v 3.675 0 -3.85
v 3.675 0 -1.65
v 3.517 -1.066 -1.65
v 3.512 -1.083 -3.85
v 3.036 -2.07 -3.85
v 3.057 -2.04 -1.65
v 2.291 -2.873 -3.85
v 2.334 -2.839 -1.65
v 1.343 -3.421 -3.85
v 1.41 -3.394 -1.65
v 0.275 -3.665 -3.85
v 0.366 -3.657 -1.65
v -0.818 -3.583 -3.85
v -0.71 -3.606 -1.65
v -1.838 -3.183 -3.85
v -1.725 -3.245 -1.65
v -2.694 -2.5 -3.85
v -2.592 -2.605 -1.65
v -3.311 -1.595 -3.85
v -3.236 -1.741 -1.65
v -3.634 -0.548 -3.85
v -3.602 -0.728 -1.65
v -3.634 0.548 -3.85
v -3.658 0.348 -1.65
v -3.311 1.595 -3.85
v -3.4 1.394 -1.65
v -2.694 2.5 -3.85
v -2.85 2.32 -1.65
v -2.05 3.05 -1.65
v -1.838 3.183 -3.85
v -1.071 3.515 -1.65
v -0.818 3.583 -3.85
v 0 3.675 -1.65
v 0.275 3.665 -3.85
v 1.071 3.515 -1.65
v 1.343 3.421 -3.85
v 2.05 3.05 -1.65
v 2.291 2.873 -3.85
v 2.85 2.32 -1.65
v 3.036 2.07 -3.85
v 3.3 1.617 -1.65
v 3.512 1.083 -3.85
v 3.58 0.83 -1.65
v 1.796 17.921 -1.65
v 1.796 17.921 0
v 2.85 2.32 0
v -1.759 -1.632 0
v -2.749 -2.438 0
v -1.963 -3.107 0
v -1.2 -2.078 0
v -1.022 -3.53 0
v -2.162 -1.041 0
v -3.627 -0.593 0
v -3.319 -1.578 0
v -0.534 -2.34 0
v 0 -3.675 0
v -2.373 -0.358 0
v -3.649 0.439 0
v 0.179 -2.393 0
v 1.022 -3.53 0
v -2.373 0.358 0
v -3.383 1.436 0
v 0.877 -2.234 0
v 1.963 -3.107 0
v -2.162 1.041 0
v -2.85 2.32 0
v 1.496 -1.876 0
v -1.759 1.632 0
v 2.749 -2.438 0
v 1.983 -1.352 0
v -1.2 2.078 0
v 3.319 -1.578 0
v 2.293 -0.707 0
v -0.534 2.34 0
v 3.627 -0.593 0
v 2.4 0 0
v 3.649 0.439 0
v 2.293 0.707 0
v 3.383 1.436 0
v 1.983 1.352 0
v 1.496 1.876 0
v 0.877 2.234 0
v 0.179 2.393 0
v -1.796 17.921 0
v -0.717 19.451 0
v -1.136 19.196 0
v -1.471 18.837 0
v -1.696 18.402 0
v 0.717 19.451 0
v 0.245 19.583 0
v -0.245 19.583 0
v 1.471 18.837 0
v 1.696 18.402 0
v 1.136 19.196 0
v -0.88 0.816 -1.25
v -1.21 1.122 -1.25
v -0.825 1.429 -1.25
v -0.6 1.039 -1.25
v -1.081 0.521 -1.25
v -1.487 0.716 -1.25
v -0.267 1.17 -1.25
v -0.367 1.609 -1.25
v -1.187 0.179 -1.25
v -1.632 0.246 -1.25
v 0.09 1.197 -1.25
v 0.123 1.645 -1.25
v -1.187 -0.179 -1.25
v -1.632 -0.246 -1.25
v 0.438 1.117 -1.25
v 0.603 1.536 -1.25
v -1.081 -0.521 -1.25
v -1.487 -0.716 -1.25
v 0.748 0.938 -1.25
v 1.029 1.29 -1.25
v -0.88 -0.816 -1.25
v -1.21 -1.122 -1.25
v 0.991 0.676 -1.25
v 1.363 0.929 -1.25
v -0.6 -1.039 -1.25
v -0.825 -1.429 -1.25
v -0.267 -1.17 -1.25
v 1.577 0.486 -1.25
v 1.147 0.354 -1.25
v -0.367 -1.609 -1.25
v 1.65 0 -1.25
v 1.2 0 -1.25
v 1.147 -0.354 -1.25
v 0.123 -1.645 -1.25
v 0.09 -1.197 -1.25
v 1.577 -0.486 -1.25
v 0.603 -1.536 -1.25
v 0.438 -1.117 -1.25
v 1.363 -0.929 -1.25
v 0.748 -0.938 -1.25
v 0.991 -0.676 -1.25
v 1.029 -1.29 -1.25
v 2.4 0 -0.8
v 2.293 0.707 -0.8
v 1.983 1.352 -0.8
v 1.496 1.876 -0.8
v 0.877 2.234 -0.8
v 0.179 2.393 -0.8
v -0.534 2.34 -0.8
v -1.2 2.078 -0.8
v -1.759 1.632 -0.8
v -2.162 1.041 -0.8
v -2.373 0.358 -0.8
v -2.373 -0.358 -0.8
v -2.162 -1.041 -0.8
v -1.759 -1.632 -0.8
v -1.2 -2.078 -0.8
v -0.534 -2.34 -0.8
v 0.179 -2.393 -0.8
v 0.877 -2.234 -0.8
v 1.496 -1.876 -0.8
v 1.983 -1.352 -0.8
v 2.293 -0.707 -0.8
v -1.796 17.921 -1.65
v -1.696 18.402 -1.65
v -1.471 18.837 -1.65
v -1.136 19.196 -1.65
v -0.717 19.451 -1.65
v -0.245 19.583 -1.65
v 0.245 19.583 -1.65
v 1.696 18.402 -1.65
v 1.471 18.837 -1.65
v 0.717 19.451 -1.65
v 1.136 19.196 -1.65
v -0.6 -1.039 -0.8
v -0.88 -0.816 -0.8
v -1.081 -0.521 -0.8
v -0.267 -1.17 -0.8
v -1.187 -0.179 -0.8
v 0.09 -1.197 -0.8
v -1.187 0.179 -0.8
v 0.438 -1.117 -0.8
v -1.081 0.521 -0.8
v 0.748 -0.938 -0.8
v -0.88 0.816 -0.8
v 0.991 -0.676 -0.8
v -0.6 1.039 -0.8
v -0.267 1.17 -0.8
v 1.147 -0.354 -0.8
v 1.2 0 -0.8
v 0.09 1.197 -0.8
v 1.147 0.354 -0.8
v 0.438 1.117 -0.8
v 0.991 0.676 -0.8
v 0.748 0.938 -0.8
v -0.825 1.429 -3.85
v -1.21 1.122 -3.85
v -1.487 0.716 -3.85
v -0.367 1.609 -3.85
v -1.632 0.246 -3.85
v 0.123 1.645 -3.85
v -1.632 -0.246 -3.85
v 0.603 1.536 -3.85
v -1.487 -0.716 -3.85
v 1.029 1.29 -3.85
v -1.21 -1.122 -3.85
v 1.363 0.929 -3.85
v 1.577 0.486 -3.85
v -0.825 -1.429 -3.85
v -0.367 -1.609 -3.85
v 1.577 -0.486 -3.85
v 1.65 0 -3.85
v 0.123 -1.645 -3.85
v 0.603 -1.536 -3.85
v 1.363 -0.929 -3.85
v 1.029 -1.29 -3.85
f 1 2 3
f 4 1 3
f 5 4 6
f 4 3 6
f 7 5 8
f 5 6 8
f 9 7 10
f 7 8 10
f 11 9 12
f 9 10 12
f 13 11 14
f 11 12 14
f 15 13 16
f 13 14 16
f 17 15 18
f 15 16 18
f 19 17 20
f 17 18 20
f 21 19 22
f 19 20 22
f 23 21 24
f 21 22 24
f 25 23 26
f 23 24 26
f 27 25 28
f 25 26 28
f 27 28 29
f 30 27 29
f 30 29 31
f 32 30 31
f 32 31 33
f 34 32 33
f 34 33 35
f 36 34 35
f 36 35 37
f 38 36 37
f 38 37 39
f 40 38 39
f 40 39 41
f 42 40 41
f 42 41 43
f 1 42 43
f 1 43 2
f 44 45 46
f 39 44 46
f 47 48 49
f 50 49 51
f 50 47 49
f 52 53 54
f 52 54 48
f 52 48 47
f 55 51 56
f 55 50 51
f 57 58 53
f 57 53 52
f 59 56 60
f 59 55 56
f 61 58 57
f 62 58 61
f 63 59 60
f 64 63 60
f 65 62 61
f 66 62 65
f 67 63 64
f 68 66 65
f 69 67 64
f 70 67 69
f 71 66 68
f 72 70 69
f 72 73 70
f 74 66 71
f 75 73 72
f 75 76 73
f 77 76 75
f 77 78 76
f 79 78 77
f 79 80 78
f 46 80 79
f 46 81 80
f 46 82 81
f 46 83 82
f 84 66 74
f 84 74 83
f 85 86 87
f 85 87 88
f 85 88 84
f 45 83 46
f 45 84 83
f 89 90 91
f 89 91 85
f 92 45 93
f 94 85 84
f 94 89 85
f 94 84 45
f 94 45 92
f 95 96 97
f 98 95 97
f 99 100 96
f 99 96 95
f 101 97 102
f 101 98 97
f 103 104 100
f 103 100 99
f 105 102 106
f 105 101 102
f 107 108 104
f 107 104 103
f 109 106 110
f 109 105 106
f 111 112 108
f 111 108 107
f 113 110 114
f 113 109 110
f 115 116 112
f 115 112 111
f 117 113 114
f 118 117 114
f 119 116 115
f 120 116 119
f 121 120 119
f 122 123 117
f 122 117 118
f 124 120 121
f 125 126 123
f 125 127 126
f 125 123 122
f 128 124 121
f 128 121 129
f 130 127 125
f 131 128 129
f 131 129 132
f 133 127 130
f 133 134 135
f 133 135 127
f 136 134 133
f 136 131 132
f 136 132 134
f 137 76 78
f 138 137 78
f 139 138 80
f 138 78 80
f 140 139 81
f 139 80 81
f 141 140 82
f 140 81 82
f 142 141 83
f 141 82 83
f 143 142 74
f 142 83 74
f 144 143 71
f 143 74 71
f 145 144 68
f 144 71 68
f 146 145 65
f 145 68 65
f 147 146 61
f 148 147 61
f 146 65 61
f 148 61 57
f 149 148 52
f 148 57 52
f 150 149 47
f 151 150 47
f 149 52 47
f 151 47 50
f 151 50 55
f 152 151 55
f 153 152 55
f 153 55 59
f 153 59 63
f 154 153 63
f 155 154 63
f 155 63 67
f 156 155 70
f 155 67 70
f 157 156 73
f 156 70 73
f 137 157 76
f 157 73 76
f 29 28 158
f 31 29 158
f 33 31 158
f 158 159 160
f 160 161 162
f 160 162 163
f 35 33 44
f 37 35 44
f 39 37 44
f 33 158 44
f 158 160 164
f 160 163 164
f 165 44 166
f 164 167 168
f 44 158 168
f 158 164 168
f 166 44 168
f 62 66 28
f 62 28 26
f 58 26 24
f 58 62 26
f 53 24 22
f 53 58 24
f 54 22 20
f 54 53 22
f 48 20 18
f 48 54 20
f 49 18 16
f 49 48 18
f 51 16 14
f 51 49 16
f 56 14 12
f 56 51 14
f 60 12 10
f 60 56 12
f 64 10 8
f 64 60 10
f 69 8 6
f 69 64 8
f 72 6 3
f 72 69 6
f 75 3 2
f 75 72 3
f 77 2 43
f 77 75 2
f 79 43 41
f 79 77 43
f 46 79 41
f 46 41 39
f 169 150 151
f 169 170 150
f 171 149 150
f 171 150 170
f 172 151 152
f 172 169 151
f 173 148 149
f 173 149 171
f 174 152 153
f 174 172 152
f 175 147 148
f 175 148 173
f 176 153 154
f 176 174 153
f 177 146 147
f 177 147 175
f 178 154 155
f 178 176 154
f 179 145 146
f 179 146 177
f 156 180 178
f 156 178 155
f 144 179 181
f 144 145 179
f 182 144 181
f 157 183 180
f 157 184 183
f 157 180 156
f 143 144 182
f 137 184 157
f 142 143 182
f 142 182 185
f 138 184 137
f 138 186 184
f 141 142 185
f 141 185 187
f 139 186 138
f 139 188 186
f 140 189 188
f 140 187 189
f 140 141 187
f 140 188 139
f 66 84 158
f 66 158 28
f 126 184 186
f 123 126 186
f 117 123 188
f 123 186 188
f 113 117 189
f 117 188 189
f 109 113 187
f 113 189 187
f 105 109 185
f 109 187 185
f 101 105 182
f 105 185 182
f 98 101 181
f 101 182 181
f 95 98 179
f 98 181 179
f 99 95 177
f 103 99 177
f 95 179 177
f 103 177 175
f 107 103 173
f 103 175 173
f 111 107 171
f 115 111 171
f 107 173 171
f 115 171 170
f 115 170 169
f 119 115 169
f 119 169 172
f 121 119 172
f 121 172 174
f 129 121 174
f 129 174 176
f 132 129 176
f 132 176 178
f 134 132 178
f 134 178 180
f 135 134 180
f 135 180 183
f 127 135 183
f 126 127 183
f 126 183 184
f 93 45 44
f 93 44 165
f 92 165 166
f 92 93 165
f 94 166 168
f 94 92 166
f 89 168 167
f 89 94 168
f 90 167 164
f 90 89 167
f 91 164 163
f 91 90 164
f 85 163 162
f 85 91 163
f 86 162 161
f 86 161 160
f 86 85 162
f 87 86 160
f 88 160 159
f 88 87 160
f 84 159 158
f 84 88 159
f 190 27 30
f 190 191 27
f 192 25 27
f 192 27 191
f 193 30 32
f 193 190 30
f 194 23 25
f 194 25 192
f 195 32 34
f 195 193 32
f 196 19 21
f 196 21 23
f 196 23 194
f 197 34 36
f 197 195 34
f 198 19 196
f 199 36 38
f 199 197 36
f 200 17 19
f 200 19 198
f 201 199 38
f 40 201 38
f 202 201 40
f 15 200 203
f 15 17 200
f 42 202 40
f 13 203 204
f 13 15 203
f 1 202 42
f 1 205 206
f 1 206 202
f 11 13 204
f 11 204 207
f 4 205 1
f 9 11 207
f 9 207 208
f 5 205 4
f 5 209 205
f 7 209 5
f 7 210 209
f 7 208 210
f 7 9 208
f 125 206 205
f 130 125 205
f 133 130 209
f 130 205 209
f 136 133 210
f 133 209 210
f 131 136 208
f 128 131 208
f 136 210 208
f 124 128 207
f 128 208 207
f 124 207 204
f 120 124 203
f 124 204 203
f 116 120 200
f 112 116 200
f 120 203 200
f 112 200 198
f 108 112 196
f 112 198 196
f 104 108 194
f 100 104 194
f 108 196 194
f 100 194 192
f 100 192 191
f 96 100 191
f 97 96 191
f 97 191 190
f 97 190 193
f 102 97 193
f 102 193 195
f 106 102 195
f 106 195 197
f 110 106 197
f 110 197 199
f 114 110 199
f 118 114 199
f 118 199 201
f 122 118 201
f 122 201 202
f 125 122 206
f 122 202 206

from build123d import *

# Parameters (mm, degrees)
PAD_DEPTH       = 1.65
SKETCH001_R     = 3.675
PAD001_DEPTH    = 2.2
SKETCH002_R     = 1.65
POCKET_DEPTH    = 2.6
SKETCH003_R     = 2.4
POCKET001_DEPTH = 0.8
SKETCH004_R     = 1.2
POCKET002_DEPTH = 3.051


with BuildPart() as part:
    # Sketch → Pad (new body)
    with BuildSketch(Plane.XY):
        with BuildLine():
            Line((-1.795904, 17.921356), (-2.85, 2.320156))
            ThreePointArc((-2.85, 2.320156), (0, -3.675), (2.85, 2.320156))
            Line((1.795904, 17.921356), (2.85, 2.320156))
            ThreePointArc((1.795904, 17.921356), (0, 19.6), (-1.795904, 17.921356))
        make_face()
    extrude(amount=-PAD_DEPTH)

    # Sketch001 → Pad001 (new body)
    with BuildSketch(Plane(origin=(0, 0, -1.65), x_dir=(1, 0, 0), z_dir=(0, 0, -1))):
        Circle(SKETCH001_R)
    extrude(amount=PAD001_DEPTH)

    # Sketch002 → Pocket (cut)
    with BuildSketch(Plane(origin=(0, 0, -3.85), x_dir=(1, 0, 0), z_dir=(0, 0, -1))):
        Circle(SKETCH002_R)
    extrude(amount=-POCKET_DEPTH, mode=Mode.SUBTRACT)

    # Sketch003 → Pocket001 (cut)
    with BuildSketch(Plane.XY):
        Circle(SKETCH003_R)
    extrude(amount=-POCKET001_DEPTH, mode=Mode.SUBTRACT)

    # Sketch004 → Pocket002 (cut, through all)
    with BuildSketch(Plane.XY.offset(-0.8)):
        Circle(SKETCH004_R)
    extrude(amount=-POCKET002_DEPTH, mode=Mode.SUBTRACT)


solid = part.part
